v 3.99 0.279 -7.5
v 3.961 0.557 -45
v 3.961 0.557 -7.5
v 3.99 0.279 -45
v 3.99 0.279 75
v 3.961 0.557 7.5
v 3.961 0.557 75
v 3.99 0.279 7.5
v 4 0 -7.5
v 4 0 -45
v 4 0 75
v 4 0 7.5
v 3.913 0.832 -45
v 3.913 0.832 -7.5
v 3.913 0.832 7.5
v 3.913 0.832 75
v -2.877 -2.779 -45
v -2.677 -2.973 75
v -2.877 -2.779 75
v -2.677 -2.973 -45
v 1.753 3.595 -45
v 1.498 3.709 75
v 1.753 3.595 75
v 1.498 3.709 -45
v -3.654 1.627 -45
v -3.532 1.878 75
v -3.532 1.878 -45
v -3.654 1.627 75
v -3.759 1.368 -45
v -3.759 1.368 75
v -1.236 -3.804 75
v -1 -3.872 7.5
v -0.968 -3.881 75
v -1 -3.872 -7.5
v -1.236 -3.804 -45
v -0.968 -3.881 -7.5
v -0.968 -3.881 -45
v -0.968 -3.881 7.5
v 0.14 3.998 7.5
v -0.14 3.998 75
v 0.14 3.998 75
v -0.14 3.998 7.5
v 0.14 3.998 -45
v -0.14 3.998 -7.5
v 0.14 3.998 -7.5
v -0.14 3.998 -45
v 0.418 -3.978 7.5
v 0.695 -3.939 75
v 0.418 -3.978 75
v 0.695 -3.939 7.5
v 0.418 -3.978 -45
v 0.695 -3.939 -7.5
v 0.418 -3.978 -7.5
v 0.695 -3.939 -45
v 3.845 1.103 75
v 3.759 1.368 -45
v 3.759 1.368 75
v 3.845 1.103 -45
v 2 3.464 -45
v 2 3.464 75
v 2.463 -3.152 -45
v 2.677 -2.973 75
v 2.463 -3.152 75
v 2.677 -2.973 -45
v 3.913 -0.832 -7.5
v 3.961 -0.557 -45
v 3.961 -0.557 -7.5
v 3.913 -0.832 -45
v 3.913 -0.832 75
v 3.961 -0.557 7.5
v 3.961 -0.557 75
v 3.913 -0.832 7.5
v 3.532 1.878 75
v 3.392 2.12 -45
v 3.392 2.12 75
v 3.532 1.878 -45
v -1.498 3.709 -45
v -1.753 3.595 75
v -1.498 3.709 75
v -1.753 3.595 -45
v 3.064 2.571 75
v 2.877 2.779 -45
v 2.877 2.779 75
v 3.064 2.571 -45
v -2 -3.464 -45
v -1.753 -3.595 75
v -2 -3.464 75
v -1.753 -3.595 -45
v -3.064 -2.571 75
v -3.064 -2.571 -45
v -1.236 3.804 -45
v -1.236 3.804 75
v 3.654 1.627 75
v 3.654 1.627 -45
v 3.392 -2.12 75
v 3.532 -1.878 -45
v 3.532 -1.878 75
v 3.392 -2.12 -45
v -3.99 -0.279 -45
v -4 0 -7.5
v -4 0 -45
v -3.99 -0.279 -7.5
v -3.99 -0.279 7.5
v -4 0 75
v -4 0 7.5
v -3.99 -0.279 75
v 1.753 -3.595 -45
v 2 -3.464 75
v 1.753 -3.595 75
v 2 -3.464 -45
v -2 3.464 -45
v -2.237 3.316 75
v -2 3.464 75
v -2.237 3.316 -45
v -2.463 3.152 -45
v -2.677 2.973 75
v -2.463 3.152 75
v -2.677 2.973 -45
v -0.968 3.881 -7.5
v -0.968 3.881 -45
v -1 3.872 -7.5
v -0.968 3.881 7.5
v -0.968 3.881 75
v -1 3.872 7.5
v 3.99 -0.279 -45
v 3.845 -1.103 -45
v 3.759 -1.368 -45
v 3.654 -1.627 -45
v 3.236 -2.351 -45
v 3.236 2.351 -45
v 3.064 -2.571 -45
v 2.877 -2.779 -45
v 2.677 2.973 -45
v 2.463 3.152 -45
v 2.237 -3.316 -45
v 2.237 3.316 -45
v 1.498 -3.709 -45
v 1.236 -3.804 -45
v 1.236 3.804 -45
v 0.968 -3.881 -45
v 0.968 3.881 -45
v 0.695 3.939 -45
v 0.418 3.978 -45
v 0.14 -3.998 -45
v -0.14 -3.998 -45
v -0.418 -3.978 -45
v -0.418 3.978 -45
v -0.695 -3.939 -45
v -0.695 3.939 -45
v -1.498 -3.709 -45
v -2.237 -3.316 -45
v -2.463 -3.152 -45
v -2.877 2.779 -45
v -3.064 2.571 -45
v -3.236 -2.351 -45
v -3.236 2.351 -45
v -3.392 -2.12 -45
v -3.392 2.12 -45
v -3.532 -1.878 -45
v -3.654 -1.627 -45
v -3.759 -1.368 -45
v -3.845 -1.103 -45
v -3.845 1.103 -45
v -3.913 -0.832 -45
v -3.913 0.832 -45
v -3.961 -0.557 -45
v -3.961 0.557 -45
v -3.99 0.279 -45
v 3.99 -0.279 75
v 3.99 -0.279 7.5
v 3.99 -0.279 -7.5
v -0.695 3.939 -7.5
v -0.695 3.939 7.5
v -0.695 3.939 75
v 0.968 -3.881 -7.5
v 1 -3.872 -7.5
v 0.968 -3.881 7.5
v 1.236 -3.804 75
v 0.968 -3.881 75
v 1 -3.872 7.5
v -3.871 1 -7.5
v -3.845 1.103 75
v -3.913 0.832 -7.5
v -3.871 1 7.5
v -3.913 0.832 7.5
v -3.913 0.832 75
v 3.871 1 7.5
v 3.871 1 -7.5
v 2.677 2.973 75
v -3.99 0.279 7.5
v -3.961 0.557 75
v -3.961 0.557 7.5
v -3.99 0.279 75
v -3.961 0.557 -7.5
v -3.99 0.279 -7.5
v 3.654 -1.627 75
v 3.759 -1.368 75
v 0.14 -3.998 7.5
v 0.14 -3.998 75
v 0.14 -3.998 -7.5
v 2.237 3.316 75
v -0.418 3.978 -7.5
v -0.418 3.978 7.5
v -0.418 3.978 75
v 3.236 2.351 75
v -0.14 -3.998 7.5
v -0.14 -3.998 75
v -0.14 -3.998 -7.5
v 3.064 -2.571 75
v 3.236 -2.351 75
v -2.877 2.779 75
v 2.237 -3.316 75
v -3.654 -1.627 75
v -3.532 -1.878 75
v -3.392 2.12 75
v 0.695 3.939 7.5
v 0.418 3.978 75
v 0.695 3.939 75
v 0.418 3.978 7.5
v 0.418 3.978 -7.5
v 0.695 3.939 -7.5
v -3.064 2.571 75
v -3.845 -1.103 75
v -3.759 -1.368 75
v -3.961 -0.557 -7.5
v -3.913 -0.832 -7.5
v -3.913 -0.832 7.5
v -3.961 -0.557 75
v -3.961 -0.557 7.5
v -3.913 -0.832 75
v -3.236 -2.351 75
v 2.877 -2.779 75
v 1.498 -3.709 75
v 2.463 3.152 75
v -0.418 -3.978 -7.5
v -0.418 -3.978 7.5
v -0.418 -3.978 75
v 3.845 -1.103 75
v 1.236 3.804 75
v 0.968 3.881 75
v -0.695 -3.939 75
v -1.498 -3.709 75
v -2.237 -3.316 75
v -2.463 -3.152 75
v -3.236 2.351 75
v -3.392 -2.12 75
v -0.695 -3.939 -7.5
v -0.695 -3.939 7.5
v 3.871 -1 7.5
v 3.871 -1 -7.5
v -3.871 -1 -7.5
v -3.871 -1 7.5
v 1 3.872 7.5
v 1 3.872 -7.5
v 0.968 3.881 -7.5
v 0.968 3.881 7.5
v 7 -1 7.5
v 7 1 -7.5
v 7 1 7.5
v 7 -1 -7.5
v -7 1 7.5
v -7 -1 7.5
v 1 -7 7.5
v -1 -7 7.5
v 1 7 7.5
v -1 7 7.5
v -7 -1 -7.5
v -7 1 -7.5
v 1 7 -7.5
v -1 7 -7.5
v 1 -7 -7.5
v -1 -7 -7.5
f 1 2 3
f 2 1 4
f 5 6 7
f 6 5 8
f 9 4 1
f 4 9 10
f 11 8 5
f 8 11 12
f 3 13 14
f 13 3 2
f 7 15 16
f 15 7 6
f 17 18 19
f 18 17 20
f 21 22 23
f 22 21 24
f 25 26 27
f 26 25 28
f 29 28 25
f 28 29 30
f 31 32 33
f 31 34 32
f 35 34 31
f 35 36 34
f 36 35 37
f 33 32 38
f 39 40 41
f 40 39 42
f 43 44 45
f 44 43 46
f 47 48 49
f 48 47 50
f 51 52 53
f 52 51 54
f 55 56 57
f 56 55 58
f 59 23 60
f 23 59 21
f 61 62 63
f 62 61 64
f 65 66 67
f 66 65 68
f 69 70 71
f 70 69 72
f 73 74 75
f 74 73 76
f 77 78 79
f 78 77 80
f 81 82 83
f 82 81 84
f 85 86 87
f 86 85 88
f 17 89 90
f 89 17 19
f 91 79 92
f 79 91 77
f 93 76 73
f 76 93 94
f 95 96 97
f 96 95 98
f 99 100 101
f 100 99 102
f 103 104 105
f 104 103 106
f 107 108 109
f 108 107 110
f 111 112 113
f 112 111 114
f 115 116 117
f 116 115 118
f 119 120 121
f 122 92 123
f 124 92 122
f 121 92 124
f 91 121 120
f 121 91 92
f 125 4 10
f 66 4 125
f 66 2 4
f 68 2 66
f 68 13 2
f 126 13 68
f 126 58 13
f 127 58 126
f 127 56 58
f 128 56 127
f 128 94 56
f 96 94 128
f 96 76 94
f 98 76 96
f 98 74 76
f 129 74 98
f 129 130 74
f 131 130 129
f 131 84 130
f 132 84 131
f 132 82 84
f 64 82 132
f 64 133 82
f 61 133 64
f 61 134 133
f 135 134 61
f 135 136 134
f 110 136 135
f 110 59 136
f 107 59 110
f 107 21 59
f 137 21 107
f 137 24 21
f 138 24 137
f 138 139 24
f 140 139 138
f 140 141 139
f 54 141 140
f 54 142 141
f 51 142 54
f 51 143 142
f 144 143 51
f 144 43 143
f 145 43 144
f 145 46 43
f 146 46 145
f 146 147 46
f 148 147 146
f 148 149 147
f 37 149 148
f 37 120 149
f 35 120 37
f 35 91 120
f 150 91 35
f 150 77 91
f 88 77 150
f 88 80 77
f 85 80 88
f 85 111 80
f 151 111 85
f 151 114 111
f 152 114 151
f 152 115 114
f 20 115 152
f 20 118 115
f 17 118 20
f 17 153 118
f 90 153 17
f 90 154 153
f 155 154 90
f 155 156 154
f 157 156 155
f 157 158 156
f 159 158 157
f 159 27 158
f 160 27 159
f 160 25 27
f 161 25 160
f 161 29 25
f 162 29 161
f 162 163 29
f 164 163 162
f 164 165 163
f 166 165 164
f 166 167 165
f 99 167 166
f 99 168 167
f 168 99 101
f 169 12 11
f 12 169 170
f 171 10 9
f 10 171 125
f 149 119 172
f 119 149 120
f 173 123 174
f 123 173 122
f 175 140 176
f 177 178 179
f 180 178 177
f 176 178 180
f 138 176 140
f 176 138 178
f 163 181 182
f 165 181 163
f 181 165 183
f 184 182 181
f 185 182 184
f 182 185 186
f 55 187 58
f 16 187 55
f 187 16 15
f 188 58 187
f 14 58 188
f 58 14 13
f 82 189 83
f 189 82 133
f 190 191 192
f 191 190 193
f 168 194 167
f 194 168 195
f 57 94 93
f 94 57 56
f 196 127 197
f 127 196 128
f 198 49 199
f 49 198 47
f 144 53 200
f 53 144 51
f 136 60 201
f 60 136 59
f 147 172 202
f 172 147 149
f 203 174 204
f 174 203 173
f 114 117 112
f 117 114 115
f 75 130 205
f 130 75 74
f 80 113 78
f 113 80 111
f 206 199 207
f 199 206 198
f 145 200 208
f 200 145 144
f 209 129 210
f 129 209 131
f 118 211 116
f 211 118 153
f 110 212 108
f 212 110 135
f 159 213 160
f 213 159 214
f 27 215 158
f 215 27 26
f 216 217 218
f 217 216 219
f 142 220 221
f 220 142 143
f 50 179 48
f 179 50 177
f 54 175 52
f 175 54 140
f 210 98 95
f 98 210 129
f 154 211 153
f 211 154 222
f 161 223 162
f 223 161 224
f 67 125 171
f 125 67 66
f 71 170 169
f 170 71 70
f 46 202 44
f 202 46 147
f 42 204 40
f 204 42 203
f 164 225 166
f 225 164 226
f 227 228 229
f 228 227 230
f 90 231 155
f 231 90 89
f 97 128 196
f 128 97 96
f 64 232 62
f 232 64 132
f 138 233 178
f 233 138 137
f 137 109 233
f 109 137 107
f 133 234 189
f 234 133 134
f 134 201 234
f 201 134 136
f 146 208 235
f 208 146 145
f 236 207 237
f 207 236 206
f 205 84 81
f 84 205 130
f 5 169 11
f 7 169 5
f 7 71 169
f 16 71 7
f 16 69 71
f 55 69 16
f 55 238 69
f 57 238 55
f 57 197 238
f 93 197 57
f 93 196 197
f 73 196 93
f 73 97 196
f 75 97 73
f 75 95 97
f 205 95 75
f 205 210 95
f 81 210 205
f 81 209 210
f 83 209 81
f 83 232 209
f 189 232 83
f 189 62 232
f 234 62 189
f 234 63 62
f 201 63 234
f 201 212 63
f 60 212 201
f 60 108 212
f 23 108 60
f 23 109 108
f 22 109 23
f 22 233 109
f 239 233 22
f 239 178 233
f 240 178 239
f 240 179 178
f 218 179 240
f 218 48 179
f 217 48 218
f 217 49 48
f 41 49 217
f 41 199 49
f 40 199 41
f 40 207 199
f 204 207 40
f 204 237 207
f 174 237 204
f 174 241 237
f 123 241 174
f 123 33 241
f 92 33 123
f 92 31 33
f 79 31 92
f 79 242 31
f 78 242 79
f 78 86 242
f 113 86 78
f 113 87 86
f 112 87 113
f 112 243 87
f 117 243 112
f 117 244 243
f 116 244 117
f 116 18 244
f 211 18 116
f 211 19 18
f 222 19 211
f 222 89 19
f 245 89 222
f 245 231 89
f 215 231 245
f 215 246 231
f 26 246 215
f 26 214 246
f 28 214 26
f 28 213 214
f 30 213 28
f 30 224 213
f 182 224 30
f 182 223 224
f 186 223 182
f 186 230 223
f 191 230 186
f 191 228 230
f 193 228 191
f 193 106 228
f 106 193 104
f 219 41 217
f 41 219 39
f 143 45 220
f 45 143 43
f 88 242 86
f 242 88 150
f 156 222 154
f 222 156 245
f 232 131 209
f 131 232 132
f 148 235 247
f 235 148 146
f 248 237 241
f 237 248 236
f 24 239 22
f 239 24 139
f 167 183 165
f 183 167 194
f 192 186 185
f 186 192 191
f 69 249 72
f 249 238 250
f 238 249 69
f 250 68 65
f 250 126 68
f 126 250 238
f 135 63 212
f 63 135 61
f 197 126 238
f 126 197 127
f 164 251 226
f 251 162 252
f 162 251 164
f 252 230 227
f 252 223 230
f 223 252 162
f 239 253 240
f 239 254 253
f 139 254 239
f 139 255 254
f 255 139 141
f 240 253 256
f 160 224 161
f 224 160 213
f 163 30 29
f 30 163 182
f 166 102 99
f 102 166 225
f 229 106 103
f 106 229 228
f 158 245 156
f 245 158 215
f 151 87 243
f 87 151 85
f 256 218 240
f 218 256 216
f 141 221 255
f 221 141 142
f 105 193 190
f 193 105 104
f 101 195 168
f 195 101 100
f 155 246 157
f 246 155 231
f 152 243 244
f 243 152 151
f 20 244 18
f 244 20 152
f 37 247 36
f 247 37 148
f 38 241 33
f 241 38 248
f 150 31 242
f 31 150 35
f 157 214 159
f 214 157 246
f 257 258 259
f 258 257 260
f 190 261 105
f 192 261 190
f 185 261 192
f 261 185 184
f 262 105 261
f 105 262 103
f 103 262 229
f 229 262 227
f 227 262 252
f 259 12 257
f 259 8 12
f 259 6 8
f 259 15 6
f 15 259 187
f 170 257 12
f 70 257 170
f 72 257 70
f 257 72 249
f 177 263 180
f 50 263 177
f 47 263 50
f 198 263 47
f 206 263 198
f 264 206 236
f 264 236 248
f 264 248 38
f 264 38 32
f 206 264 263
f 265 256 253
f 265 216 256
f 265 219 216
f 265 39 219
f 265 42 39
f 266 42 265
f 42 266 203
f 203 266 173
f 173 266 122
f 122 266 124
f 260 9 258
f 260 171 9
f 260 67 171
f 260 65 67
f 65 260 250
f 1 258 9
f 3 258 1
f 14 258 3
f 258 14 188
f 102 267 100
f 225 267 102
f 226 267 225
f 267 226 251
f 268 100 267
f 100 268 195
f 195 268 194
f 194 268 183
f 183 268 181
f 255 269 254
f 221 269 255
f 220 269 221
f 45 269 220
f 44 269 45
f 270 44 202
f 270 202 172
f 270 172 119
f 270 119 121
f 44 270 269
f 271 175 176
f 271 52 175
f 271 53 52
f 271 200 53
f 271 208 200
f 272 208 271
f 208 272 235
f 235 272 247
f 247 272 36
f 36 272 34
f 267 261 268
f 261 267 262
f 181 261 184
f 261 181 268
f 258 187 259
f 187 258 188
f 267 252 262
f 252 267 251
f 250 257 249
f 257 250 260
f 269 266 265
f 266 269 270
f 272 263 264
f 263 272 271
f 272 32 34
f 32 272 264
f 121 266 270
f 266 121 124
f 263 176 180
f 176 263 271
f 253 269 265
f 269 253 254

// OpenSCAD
// Global
$fn=90;

// Shaft for the high frequence alternator
// Likely should be made out of steel
// Units should be mm (at least for 3DHubs case)
union() {
    translate ( [0, 0, 15] ) cylinder( h=120, d=8, center=true );
    cube( size=[14,2,15], center=true );
    rotate(90) cube( size=[14,2,15], center=true );
}
